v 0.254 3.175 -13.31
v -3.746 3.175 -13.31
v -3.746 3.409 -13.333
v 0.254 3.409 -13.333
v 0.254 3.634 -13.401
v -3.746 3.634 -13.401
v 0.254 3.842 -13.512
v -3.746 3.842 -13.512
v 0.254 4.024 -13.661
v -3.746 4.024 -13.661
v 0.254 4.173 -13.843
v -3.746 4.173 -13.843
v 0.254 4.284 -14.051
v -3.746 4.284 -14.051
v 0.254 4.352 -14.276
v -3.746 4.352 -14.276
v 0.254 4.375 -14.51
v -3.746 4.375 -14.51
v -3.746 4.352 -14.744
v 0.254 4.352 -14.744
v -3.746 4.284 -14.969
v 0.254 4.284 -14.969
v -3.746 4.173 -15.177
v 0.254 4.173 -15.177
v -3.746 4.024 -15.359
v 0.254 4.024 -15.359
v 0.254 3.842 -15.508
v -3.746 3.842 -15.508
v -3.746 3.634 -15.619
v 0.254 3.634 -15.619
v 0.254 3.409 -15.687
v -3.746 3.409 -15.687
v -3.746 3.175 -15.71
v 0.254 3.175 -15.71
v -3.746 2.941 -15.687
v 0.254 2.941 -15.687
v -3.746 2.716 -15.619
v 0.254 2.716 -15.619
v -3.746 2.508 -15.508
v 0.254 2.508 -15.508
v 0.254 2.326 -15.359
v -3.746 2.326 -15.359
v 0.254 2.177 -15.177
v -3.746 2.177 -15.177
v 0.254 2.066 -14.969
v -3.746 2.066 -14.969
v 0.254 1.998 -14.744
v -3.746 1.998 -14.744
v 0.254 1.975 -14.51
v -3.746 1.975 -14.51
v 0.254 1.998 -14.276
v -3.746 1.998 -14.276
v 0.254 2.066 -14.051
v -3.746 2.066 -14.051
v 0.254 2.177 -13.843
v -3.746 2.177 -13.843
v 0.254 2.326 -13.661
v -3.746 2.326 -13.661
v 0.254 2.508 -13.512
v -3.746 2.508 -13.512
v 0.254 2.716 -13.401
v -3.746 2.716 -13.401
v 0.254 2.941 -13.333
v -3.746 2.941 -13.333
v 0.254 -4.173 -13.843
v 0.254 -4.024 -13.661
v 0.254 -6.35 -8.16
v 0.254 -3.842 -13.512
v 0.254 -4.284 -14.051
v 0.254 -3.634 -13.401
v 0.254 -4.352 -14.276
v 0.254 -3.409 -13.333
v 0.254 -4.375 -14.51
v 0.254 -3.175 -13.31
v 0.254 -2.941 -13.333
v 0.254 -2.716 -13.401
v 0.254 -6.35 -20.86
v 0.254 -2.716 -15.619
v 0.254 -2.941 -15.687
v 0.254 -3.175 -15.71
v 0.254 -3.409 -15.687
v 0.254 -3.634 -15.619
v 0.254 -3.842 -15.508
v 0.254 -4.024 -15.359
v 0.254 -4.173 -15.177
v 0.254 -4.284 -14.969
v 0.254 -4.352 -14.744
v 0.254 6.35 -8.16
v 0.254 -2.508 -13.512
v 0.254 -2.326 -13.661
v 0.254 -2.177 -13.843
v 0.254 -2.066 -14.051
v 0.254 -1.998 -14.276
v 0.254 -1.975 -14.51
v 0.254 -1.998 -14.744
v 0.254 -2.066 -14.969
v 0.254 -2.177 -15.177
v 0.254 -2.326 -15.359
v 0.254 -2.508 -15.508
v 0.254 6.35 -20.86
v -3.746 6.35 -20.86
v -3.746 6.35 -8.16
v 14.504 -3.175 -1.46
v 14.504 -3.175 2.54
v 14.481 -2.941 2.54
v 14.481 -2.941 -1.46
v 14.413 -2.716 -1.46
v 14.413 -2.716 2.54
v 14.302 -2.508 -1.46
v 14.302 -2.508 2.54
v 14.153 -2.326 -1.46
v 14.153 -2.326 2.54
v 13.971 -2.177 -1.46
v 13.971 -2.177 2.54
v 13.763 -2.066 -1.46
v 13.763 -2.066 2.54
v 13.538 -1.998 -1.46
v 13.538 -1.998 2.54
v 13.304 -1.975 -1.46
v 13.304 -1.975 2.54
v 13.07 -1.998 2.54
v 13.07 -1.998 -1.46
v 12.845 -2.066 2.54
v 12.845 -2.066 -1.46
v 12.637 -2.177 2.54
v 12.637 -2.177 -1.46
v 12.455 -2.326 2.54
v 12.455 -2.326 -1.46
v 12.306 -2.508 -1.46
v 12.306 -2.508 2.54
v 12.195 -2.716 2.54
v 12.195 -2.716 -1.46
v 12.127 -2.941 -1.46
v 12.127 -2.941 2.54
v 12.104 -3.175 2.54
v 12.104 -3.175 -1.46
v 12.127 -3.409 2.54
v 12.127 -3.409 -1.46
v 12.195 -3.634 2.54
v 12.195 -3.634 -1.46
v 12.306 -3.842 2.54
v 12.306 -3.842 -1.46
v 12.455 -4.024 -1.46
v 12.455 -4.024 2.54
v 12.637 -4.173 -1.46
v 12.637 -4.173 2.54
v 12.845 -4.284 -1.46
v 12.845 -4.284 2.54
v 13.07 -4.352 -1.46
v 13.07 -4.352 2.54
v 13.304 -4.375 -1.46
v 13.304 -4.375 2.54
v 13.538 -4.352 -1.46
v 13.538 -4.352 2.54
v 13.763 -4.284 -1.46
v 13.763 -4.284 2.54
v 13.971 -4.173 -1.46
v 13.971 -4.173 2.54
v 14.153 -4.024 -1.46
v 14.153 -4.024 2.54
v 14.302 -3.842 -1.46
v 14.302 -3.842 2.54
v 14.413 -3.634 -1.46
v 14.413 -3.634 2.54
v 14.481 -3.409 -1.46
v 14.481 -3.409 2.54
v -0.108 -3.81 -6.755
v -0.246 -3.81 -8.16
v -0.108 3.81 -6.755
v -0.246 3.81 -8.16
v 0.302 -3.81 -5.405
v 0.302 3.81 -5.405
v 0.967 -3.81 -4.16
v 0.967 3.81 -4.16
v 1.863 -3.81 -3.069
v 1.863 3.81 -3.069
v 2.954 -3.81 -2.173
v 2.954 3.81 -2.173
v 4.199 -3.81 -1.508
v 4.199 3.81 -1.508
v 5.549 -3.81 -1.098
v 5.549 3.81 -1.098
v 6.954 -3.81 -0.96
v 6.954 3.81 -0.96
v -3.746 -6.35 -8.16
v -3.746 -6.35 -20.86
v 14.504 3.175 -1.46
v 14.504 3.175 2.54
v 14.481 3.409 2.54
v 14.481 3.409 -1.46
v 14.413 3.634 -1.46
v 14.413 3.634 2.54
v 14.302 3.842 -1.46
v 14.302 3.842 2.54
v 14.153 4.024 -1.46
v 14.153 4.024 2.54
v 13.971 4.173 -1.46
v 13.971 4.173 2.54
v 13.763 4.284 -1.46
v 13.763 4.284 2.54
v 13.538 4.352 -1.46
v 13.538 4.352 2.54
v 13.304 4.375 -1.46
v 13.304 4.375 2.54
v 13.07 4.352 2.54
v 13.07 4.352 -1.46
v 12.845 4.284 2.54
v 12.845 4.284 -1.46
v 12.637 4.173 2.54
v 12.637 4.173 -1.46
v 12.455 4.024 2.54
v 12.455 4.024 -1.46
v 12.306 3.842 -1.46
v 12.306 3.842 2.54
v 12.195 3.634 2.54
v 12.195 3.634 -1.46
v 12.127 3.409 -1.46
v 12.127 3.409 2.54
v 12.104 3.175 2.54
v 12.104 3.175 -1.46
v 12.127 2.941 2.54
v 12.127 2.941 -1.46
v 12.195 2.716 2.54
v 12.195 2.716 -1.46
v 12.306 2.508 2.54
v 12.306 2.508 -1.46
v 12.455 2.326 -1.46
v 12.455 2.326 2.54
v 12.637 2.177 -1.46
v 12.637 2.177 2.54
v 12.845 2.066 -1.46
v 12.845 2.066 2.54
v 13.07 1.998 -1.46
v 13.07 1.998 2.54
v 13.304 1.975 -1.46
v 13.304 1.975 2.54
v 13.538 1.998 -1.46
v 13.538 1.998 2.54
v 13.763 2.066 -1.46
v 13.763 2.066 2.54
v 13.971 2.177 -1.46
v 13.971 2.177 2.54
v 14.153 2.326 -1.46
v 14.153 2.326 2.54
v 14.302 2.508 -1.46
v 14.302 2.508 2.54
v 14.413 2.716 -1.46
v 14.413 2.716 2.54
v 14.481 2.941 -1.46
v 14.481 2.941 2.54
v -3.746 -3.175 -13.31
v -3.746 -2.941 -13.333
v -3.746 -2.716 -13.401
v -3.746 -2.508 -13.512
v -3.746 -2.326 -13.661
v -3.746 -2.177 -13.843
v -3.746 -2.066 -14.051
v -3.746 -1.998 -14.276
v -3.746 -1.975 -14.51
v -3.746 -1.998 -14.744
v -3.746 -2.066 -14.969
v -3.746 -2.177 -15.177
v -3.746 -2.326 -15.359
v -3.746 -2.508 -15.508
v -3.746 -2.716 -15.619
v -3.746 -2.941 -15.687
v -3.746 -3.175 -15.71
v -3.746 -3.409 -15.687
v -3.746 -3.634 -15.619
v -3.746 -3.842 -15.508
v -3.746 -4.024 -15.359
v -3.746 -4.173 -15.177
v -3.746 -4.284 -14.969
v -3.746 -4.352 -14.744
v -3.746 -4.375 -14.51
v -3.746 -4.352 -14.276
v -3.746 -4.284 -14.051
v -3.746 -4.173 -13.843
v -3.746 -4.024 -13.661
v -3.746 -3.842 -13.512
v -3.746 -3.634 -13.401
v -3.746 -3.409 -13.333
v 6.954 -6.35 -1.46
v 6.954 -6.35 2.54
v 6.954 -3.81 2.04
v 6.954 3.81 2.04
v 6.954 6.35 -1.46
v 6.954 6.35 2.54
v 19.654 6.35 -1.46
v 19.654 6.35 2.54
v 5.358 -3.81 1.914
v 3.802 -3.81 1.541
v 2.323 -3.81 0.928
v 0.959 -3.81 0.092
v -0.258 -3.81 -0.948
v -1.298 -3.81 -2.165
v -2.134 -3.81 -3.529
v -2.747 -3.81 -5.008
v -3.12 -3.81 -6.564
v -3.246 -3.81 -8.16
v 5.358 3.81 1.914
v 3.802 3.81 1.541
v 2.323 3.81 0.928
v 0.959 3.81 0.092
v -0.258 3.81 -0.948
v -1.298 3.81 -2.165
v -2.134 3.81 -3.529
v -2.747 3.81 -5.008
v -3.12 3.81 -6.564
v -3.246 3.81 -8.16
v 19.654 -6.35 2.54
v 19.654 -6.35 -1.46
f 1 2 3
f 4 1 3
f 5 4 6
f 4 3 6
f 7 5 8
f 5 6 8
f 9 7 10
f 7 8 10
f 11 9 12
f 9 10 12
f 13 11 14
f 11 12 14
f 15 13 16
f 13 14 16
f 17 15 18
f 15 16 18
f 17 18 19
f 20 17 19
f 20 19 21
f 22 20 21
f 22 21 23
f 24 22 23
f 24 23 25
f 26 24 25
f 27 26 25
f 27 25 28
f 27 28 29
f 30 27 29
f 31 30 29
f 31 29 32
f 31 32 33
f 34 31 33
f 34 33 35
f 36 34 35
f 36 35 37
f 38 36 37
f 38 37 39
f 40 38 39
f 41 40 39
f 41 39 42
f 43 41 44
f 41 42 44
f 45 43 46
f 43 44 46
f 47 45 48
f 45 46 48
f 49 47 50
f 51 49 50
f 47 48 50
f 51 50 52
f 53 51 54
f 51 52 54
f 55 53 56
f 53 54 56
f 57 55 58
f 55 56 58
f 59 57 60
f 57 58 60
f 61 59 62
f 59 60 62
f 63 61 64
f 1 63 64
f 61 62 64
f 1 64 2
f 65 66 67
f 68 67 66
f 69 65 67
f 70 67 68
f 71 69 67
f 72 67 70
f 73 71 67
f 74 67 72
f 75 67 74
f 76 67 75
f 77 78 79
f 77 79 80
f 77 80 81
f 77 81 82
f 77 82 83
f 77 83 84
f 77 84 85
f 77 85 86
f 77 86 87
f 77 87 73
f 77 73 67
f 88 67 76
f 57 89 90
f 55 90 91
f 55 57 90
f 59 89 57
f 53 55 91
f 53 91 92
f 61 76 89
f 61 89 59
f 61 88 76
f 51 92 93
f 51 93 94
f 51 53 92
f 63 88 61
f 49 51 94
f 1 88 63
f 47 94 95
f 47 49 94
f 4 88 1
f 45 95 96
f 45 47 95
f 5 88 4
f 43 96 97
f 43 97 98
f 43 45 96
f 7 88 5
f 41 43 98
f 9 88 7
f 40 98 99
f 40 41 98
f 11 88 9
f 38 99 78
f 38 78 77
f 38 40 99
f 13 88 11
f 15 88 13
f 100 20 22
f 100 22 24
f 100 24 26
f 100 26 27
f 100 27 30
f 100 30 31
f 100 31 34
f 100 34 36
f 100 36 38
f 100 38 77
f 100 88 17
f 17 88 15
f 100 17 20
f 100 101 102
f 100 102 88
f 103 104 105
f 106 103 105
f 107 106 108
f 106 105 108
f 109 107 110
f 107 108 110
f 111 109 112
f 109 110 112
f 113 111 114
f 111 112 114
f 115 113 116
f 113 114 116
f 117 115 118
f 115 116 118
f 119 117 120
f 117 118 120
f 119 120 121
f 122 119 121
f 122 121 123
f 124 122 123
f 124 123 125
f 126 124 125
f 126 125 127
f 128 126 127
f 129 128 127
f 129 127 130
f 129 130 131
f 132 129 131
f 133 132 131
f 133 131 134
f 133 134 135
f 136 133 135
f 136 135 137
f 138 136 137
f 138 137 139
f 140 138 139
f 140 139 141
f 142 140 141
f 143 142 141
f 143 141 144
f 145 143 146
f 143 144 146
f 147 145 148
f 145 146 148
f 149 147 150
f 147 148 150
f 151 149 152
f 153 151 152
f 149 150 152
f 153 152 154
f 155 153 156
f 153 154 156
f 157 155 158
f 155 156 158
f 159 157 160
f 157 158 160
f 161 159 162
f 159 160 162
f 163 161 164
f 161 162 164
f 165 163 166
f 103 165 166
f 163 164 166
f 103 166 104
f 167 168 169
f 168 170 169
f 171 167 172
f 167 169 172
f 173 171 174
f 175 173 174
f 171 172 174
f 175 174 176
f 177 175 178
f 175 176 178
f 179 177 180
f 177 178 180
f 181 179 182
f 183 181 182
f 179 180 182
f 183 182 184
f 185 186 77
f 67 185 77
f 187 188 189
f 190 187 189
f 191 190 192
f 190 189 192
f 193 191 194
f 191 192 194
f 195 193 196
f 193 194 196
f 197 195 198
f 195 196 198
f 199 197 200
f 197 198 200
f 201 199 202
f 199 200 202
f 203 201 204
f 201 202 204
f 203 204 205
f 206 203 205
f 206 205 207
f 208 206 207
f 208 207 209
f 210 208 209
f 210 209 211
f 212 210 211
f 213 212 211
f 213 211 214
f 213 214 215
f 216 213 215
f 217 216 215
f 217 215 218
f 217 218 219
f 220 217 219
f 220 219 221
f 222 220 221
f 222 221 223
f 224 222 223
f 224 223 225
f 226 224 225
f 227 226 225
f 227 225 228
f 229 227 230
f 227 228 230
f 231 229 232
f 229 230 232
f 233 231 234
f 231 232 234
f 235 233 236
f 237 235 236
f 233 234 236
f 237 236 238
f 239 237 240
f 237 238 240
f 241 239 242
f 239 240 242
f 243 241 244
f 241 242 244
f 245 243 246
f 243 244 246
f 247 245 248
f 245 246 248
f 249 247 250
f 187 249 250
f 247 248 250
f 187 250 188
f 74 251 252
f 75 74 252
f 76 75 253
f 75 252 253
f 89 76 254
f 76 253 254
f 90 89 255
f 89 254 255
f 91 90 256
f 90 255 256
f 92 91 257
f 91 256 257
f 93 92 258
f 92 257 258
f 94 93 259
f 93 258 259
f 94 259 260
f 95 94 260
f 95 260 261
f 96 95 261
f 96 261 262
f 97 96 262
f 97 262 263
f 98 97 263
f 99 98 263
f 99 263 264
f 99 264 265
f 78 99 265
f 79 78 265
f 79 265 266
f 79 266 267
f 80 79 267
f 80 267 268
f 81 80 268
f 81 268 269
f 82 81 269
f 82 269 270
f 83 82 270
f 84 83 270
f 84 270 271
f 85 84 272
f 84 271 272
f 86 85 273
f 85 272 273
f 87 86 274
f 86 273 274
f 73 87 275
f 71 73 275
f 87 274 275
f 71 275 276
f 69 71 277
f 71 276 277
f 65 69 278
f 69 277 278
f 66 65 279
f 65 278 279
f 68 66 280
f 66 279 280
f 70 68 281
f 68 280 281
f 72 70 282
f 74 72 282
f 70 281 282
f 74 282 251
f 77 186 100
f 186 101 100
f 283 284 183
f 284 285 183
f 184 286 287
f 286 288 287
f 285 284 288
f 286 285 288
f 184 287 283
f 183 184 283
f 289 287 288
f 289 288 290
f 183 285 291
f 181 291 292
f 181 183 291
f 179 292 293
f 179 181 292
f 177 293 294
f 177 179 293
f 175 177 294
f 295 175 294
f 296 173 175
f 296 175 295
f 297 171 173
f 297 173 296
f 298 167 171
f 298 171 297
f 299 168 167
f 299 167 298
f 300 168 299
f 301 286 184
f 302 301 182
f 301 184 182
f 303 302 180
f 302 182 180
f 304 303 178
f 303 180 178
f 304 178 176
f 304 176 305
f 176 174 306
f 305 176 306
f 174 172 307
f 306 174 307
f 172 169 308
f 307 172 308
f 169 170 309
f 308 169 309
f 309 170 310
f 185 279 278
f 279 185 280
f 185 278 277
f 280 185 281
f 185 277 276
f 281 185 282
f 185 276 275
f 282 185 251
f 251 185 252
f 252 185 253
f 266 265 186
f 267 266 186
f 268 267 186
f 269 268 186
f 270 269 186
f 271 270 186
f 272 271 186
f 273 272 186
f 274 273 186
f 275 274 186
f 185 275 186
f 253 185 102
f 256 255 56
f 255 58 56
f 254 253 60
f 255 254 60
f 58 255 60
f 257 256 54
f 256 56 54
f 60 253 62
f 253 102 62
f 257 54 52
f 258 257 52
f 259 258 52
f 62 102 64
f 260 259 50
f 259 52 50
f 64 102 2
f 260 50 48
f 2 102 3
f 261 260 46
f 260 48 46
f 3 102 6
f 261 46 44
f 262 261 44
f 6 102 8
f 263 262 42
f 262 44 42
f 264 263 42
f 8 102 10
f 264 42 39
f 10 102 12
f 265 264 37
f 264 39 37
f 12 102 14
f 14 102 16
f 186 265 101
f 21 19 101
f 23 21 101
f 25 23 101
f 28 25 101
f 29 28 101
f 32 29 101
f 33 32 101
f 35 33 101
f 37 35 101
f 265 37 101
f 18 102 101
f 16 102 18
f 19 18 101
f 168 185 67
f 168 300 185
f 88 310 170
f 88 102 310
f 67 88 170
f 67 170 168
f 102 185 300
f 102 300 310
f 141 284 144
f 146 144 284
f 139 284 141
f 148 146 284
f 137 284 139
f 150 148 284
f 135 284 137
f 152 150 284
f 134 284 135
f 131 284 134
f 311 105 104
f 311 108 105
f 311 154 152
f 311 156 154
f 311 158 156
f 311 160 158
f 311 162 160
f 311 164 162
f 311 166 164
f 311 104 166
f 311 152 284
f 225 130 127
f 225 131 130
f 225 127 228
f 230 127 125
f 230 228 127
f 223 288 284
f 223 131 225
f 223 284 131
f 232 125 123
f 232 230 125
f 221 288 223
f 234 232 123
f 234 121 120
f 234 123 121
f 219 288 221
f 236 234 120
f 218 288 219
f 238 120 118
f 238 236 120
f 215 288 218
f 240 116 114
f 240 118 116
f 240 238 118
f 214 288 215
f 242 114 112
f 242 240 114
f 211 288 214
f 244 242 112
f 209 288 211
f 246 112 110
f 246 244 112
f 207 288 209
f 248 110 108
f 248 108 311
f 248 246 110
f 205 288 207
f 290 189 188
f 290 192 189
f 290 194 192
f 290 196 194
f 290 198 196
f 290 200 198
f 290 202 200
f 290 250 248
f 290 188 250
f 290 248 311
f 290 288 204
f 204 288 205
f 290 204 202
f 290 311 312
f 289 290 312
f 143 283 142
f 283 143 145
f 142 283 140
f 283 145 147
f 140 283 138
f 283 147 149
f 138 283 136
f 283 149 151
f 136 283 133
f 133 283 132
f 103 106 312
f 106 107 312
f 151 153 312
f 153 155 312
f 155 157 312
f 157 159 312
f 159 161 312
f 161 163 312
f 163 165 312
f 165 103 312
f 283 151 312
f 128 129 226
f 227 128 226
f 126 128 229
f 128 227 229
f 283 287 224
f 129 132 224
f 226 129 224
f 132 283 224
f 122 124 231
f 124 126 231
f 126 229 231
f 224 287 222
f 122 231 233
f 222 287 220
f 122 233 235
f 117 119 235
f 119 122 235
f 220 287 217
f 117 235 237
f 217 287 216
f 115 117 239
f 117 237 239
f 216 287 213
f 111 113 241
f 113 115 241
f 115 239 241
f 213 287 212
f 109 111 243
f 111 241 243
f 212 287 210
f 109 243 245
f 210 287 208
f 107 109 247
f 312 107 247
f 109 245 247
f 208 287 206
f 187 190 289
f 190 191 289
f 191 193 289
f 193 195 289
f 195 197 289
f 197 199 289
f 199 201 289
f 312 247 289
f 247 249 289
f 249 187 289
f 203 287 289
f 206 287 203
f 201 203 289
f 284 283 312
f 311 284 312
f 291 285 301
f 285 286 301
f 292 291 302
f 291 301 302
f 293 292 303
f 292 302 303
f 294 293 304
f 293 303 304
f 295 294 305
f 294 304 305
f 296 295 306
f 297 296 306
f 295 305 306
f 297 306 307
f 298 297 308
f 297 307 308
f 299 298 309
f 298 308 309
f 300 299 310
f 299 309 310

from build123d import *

# Parameters (mm, degrees)
BOSS_EXTRUDE1_DEPTH  = 3.81
SKETCH3_W            = 12.7
SKETCH3_H            = 4
SKETCH3_W_2          = 4
SKETCH3_H_2          = 12.7
BOSS_EXTRUDE2_DEPTH  = 2.54
M2_CLEARANCE_HOLE1_D = 2.4
M2_CLEARANCE_HOLE2_D = 2.4


with BuildPart() as part:
    # Sketch2 → Boss-Extrude1 (new body, symmetric)
    with BuildSketch(Plane(origin=(0, 0, 0), x_dir=(1, 0, 0), z_dir=(0, 1, 0))):
        with BuildLine():
            Line((-3.746, 20.86), (0.254, 20.86))
            Line((0.254, 20.86), (0.254, 8.16))
            Line((0.254, 8.16), (-0.246, 8.16))
            ThreePointArc((-0.246, 8.16), (1.862831175, 3.068831175), (6.954, 0.96))
            Line((6.954, 0.96), (6.954, 1.46))
            Line((6.954, 1.46), (19.654, 1.46))
            Line((19.654, 1.46), (19.654, -2.54))
            Line((19.654, -2.54), (6.954, -2.54))
            Line((6.954, -2.54), (6.954, -2.04))
            ThreePointArc((6.954, -2.04), (-0.258489168, 0.947510832), (-3.246, 8.16))
            Line((-3.246, 8.16), (-3.746, 8.16))
            Line((-3.746, 8.16), (-3.746, 20.86))
        make_face()
    extrude(amount=BOSS_EXTRUDE1_DEPTH, both=True)

    # Sketch3 → Boss-Extrude2 (add)
    with BuildSketch(Plane(origin=(0, 3.81, 0), x_dir=(1, 0, 0), z_dir=(0, 1, 0))):
        with Locations((13.304, -0.54)):
            Rectangle(SKETCH3_W, SKETCH3_H)
        with Locations((-1.746, 14.51)):
            Rectangle(SKETCH3_W_2, SKETCH3_H_2)
    boss_extrude2 = extrude(amount=BOSS_EXTRUDE2_DEPTH)

    # Mirror1: Boss-Extrude2 across plane
    add(boss_extrude2.mirror(Plane.ZX))

    # M2 Clearance Hole1 (through all)
    with Locations(Plane(origin=(0.254, 0, 0), x_dir=(0, 0, -1), z_dir=(1, 0, 0))):
        with Locations((14.51, 3.175), (14.51, -3.175)):
            Hole(M2_CLEARANCE_HOLE1_D / 2)

    # M2 Clearance Hole2 (through all)
    with Locations(Plane(origin=(0, 0, -1.46), x_dir=(-1, 0, 0), z_dir=(0, 0, -1))):
        with Locations((-13.304, 3.175), (-13.304, -3.175)):
            Hole(M2_CLEARANCE_HOLE2_D / 2)


solid = part.part
